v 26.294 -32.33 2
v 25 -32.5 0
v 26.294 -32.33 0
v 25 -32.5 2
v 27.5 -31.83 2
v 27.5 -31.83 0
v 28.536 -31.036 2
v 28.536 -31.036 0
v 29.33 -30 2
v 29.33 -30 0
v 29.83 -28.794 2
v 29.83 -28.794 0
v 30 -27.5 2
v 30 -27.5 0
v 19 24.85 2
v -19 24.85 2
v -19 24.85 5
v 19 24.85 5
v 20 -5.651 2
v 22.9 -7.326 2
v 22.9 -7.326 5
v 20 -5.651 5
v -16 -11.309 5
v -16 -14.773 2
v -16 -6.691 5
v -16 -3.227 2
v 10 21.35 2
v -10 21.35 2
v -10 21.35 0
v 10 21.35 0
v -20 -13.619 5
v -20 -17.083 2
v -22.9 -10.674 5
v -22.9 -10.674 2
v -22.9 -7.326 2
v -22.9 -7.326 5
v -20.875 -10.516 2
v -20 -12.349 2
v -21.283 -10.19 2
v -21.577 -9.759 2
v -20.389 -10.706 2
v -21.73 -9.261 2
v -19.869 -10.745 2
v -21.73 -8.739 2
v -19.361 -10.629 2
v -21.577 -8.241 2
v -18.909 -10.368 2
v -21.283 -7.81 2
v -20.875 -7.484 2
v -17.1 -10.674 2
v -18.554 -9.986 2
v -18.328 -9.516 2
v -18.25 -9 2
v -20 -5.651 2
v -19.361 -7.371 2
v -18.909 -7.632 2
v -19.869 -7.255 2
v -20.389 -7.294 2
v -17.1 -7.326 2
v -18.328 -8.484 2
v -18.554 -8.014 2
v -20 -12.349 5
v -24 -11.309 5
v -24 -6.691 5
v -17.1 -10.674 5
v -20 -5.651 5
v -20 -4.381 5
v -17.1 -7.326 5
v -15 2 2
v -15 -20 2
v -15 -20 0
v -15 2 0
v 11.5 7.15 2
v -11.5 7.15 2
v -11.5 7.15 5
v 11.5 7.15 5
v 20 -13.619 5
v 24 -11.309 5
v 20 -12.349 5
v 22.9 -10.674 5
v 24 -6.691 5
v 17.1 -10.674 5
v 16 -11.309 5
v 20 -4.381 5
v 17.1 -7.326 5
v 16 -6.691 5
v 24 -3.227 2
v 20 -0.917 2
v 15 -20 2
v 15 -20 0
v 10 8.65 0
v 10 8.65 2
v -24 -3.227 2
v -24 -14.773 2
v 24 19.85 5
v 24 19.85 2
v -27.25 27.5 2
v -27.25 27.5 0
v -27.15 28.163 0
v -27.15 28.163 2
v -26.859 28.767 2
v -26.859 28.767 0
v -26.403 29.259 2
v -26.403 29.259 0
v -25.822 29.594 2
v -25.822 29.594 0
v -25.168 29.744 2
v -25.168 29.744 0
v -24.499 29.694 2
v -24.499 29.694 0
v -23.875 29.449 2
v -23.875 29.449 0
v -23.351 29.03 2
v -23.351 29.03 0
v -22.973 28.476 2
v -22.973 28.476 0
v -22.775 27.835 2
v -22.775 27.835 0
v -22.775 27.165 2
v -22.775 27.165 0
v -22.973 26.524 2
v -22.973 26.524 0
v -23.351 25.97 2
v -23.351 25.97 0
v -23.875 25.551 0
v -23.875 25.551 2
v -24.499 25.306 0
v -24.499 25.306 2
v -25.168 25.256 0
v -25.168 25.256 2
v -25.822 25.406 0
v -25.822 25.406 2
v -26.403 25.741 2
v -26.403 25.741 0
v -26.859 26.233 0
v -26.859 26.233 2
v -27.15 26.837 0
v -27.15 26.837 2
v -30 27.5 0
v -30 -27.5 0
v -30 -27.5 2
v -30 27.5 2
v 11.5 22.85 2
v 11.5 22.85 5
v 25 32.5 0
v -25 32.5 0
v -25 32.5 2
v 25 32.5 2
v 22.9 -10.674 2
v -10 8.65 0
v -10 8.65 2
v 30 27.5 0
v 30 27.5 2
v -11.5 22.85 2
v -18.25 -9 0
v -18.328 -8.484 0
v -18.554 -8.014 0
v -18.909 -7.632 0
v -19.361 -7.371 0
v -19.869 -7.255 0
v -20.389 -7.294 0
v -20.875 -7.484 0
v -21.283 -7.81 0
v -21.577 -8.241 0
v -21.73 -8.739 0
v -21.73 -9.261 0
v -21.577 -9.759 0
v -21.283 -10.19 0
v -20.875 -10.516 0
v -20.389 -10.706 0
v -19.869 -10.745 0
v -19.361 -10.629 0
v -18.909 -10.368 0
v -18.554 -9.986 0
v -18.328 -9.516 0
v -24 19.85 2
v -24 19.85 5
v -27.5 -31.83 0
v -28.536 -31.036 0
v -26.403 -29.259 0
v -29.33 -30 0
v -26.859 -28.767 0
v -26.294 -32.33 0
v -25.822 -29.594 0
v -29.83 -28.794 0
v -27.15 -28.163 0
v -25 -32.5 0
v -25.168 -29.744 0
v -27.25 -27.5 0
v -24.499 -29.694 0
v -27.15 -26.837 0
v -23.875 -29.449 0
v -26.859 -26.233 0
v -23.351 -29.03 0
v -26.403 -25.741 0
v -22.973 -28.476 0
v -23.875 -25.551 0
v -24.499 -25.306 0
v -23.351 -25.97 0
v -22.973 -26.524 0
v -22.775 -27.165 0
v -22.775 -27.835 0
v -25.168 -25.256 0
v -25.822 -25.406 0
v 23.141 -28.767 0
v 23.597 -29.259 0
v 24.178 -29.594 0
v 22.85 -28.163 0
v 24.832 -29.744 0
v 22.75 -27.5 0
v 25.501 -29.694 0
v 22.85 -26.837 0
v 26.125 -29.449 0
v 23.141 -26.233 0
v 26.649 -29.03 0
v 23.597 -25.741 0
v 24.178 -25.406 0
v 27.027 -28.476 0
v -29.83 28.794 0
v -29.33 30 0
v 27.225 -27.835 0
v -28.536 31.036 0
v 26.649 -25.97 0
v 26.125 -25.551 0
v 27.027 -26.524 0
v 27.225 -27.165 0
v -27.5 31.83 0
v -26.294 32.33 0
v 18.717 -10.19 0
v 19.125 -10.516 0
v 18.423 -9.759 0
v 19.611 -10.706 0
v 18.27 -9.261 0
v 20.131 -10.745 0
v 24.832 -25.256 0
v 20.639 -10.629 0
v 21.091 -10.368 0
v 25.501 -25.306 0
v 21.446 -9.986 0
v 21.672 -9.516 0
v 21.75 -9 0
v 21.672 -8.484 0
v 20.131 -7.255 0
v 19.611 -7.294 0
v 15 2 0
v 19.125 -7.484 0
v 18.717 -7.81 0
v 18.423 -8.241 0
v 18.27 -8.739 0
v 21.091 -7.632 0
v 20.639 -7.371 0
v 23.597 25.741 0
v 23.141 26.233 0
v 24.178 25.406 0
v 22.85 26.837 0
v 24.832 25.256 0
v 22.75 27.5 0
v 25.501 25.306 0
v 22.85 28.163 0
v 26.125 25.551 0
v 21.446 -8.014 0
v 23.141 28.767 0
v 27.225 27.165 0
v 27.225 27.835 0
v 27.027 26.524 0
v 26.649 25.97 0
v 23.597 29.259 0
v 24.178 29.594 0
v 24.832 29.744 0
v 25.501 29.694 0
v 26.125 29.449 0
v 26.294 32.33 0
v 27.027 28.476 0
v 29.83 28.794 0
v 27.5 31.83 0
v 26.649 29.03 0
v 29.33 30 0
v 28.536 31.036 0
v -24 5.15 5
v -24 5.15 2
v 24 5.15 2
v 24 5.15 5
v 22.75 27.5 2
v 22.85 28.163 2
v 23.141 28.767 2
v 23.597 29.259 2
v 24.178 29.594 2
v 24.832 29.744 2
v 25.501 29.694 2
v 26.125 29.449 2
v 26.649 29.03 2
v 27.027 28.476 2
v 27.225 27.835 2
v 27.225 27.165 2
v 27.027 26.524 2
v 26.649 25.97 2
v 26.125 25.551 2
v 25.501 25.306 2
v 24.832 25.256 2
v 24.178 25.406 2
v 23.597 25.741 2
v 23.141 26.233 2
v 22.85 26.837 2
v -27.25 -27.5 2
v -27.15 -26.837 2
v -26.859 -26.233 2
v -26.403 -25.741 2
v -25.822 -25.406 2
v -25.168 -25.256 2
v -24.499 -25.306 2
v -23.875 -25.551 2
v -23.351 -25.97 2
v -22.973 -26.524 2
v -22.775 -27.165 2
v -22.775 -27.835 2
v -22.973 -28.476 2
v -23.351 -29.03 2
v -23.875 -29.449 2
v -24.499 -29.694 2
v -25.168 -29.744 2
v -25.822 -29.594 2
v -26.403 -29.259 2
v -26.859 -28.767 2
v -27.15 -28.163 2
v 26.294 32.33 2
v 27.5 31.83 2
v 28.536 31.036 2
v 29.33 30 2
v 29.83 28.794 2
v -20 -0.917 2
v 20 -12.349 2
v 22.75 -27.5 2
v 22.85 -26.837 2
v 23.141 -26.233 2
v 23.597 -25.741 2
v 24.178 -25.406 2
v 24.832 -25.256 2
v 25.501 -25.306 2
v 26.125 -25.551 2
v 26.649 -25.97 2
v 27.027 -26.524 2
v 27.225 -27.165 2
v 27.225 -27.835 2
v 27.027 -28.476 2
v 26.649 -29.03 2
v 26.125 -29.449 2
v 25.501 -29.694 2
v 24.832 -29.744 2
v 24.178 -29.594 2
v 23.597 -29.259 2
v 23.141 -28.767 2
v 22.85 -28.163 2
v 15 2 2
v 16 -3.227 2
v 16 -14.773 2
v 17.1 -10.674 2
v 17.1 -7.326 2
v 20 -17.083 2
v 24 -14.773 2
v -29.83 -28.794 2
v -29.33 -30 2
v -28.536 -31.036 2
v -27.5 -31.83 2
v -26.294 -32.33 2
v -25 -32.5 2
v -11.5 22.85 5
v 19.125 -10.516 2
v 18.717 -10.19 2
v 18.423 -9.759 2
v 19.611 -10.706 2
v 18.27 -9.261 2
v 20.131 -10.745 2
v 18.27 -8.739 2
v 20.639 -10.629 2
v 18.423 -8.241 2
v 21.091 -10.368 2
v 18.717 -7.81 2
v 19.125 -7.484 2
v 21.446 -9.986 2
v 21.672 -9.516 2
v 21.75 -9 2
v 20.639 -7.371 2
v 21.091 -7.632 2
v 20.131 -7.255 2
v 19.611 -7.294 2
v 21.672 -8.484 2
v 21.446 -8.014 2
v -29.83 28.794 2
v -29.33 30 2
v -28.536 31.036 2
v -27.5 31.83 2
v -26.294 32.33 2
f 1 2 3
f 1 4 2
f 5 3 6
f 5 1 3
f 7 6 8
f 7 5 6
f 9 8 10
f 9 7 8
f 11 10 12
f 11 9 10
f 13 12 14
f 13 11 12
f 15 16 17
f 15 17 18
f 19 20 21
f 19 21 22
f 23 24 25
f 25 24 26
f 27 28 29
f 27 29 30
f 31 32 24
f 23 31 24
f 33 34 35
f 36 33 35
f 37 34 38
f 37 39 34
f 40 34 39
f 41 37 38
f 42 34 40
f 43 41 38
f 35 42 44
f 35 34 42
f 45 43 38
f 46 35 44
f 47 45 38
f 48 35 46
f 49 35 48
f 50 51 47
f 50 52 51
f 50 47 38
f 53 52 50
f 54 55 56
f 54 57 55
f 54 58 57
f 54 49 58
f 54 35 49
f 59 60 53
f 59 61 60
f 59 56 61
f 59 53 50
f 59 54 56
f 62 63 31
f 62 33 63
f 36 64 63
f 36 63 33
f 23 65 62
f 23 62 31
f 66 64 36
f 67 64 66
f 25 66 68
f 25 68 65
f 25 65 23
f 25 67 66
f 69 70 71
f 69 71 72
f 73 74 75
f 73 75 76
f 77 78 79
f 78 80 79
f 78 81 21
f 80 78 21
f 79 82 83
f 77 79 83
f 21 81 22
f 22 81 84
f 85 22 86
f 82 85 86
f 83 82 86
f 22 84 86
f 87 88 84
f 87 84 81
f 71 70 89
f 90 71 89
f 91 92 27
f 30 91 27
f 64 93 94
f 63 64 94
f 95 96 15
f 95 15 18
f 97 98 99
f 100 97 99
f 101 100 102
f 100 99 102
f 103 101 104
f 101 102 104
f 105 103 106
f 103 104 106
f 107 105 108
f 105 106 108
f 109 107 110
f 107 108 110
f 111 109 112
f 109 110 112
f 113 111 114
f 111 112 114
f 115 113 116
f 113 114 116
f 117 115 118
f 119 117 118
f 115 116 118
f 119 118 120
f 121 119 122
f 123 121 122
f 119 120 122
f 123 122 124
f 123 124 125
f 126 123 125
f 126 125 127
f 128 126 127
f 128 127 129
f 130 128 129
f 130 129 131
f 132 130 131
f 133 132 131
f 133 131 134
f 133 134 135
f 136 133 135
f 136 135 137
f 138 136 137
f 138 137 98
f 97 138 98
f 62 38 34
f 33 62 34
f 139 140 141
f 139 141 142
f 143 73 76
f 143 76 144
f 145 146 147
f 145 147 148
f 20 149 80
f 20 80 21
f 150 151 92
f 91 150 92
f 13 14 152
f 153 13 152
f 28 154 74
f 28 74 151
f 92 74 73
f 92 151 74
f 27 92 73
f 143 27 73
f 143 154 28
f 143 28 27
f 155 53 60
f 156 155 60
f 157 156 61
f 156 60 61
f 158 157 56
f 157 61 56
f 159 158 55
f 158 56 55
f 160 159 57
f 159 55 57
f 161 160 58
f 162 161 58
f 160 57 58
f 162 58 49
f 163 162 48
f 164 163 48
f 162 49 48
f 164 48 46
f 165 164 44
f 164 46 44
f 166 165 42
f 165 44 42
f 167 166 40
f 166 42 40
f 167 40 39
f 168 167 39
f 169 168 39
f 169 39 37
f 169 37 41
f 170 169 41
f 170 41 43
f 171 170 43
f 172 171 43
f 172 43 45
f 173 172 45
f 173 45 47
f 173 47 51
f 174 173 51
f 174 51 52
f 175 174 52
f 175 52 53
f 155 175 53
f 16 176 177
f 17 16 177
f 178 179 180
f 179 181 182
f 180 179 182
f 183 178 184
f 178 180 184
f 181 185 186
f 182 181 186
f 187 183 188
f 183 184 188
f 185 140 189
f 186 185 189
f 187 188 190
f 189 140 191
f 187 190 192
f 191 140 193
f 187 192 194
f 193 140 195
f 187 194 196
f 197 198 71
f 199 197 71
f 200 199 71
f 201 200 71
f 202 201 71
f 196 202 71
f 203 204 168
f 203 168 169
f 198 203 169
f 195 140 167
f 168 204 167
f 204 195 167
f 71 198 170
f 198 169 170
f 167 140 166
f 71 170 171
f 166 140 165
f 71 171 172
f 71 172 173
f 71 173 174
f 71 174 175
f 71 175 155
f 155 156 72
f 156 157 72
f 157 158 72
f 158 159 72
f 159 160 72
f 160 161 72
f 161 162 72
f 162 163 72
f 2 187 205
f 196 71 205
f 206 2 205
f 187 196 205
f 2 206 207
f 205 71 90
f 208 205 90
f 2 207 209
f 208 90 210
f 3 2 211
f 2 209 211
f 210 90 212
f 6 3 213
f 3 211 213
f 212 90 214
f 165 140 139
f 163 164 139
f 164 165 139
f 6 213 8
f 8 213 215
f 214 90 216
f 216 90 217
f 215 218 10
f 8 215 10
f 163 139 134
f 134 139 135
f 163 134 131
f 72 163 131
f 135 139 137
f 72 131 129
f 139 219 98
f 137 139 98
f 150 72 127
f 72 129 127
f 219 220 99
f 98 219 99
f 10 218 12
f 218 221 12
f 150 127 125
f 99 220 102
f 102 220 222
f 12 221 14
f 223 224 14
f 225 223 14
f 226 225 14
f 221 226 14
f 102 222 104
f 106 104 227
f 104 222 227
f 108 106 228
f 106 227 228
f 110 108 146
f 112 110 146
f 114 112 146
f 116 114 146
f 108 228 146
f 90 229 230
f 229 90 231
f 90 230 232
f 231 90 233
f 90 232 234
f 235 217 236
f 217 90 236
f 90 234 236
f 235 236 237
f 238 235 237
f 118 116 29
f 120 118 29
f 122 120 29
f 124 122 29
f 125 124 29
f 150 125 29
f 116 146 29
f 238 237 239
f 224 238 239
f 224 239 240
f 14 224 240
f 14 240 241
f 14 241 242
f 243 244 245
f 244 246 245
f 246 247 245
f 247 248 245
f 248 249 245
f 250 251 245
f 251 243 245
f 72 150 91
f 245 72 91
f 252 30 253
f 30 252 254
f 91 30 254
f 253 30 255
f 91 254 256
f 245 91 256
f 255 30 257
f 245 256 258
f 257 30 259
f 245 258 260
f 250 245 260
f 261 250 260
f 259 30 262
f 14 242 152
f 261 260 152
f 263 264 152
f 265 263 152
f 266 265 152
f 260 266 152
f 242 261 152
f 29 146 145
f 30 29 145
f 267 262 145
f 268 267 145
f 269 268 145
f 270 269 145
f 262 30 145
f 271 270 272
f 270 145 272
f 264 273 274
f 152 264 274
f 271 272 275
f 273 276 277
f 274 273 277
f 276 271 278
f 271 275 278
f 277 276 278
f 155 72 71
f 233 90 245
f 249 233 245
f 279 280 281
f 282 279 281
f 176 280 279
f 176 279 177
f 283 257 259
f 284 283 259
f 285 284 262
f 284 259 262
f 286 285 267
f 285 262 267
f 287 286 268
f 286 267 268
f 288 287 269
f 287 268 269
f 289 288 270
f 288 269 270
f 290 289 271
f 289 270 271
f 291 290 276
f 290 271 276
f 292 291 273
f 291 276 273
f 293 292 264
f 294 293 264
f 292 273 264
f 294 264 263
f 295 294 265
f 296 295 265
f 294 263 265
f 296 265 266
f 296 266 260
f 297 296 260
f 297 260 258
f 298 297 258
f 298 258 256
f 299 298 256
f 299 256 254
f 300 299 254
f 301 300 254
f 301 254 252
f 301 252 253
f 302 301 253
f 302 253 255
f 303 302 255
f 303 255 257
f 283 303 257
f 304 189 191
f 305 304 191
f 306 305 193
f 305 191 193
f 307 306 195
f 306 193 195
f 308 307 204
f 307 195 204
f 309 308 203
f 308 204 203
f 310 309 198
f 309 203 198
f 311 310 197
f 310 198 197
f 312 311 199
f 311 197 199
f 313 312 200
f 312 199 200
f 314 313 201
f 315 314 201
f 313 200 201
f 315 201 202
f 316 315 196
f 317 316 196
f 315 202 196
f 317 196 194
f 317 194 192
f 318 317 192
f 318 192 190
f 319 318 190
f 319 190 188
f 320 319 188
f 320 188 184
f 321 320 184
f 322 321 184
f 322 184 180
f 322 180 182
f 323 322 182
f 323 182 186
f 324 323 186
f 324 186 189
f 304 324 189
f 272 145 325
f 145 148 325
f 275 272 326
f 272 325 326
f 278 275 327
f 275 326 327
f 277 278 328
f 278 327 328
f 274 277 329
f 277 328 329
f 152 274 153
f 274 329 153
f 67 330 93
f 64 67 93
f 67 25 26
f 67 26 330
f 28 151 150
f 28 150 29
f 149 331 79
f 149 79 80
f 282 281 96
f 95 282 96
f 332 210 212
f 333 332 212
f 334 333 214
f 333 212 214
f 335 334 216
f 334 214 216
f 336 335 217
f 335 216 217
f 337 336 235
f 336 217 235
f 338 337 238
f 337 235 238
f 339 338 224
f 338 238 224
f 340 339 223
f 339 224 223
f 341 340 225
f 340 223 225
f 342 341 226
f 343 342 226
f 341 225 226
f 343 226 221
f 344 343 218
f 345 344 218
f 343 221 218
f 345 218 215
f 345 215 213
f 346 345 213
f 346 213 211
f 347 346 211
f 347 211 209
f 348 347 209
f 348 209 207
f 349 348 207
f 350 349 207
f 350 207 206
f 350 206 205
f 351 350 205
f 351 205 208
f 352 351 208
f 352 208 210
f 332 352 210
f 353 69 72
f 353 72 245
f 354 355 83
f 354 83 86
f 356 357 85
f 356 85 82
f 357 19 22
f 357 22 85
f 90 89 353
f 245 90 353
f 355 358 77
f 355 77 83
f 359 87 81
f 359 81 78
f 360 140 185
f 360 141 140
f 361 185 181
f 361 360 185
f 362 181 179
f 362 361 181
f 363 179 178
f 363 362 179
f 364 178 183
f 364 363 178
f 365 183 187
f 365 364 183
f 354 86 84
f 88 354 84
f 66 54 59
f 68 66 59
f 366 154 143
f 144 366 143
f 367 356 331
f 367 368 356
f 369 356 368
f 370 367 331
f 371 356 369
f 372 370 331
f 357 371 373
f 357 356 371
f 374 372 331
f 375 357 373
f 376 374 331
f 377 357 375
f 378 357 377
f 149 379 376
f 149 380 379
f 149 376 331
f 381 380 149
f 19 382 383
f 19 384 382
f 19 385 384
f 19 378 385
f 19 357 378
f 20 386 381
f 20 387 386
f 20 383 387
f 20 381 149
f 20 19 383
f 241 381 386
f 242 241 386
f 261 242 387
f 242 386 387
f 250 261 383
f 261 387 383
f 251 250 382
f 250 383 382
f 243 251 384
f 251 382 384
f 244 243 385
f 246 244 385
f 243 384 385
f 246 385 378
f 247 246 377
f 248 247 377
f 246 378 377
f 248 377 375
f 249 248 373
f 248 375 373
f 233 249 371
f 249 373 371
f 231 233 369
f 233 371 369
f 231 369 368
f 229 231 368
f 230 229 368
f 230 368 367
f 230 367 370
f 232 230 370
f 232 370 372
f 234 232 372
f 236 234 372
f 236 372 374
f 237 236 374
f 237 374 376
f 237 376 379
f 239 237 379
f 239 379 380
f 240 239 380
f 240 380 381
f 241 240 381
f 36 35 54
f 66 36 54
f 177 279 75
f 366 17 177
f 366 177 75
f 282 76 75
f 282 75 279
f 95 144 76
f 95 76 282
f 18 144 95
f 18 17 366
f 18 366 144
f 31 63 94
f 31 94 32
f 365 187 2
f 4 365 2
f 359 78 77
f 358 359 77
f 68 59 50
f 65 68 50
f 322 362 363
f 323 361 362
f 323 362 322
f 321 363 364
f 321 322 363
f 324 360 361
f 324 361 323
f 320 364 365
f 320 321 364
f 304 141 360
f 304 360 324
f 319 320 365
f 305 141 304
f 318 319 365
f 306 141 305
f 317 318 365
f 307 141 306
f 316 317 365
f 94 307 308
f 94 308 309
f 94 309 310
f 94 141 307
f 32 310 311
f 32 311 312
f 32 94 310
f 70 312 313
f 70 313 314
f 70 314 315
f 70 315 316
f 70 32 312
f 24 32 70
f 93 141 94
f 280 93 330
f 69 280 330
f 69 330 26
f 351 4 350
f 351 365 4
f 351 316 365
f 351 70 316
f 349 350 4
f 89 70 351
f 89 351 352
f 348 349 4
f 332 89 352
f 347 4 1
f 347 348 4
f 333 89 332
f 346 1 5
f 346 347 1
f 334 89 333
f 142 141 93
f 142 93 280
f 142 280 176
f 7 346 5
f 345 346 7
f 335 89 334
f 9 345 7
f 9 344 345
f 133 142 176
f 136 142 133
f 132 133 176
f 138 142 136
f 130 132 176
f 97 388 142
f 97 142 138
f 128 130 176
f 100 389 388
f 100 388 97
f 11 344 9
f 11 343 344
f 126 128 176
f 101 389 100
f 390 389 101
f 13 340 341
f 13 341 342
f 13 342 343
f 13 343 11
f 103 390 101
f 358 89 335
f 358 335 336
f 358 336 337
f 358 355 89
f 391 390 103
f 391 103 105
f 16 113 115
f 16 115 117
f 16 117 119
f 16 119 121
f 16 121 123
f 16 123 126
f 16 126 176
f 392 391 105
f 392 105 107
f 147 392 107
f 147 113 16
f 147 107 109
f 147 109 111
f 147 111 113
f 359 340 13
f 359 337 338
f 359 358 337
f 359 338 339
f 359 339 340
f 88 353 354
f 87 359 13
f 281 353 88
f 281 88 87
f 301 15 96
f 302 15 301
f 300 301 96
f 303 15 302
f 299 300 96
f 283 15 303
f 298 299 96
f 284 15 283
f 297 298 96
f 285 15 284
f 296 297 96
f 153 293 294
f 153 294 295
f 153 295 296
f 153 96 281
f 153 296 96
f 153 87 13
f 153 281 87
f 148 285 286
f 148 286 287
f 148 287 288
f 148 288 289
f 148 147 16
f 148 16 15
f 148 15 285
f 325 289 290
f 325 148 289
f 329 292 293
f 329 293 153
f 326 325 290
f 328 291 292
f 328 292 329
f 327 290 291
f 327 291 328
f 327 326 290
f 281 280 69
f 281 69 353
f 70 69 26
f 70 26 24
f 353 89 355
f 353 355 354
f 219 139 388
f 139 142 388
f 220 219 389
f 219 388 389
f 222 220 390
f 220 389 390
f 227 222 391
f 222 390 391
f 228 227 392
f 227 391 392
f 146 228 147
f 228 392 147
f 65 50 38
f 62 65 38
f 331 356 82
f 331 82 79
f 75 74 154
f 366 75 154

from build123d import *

# Parameters (mm, degrees)
F0_W      = 60
F0_H      = 65
F1_DEPTH  = 2
F2_W      = 20
F2_H      = 12.7
F3_DEPTH  = 25
F4_R      = 1.75
F4_W      = 30
F4_H      = 22
F5_DEPTH  = 25
F7_DEPTH  = 3
F8_SIZE   = 2.99999
F10_D     = 4.5
F11_R     = 5
F12_W     = 48
F12_H     = 19.7
F12_W_2   = 23
F12_H_2   = 15.7
F13_DEPTH = 3
F14_SIZE  = 5


# Not quite as in the source:
# - a fillet or chamfer is up to 0.001 mm smaller than in the source, because OpenCascade refuses the exact size
# - a pattern or mirror of a feature is missing from the dataset's text; its kind, count and spacing are read off the source's solid


with BuildPart() as f1:
    # F0 (on Top) → F1 (new body)
    with BuildSketch(Plane.XY):
        Rectangle(F0_W, F0_H)
    extrude(amount=F1_DEPTH)

    # F2 (on face) → F3 (cut)
    with BuildSketch(Plane.XY.offset(2)):
        with Locations((0, 15)):
            Rectangle(F2_W, F2_H)
    extrude(amount=-F3_DEPTH, mode=Mode.SUBTRACT)

    # F4 (on face) → F5 (cut)
    with BuildSketch(Plane.XY.offset(2)):
        with Locations((-20, -9)):
            Circle(F4_R)
        with Locations((0, -9)):
            Rectangle(F4_W, F4_H)
        with Locations((20, -9)):
            Circle(F4_R)
    extrude(amount=-F5_DEPTH, mode=Mode.SUBTRACT)

    # F6 (on face) → F7 (join)
    with BuildSketch(Plane.XY.offset(2)):
        Polygon((-24, -6.6905989232), (-24, -11.3094010768), (-20, -13.6188021535), (-16, -11.3094010768), (-16, -6.6905989232), (-20, -4.3811978465), align=None)
        Polygon((-20, -12.3486315613), (-22.9, -10.6743157806), (-22.9, -7.3256842194), (-20, -5.6513684387), (-17.1, -7.3256842194), (-17.1, -10.6743157806), align=None, mode=Mode.SUBTRACT)
    f7 = extrude(amount=F7_DEPTH)

    # F7_copies: F7 across plane
    add(f7.mirror(Plane(origin=(0, 0, 0), x_dir=(0, 0, 1), z_dir=(1, 0, 0))))

    # F8 (size 3 in the source; OpenCascade refuses exactly that, so slightly less here)
    f8_edges = [f1.edges().sort_by_distance(p)[0] for p in [
        (-22, -12.464102, 2),
        (-18, -12.464102, 2),
        (-22, -5.535898, 2),
        (-18, -5.535898, 2),
        (18, -5.535898, 2),
        (18, -12.464102, 2),
        (22, -12.464102, 2),
        (22, -5.535898, 2),
    ]]
    chamfer(f8_edges, length=F8_SIZE)

    # F10 (through all)
    with Locations(Plane.XY.offset(2)):
        with Locations((-25, 27.5), (25, 27.5), (25, -27.5), (-25, -27.5)):
            Hole(F10_D / 2)

    # F11
    f11_edges = [f1.edges().sort_by_distance(p)[0] for p in [
        (30, 32.5, 1),
        (-30, 32.5, 1),
        (30, -32.5, 1),
        (-30, -32.5, 1),
    ]]
    fillet(f11_edges, radius=F11_R)

    # F12 (on face) → F13 (join)
    with BuildSketch(Plane.XY.offset(2)):
        with Locations((0, 15)):
            Rectangle(F12_W, F12_H)
        with Locations((0, 15)):
            Rectangle(F12_W_2, F12_H_2, mode=Mode.SUBTRACT)
    extrude(amount=F13_DEPTH)

    # F14
    f14_edges = [f1.edges().sort_by_distance(p)[0] for p in [
        (24, 24.85, 3.5),
        (-24, 24.85, 3.5),
    ]]
    chamfer(f14_edges, length=F14_SIZE)


solid = f1.part
